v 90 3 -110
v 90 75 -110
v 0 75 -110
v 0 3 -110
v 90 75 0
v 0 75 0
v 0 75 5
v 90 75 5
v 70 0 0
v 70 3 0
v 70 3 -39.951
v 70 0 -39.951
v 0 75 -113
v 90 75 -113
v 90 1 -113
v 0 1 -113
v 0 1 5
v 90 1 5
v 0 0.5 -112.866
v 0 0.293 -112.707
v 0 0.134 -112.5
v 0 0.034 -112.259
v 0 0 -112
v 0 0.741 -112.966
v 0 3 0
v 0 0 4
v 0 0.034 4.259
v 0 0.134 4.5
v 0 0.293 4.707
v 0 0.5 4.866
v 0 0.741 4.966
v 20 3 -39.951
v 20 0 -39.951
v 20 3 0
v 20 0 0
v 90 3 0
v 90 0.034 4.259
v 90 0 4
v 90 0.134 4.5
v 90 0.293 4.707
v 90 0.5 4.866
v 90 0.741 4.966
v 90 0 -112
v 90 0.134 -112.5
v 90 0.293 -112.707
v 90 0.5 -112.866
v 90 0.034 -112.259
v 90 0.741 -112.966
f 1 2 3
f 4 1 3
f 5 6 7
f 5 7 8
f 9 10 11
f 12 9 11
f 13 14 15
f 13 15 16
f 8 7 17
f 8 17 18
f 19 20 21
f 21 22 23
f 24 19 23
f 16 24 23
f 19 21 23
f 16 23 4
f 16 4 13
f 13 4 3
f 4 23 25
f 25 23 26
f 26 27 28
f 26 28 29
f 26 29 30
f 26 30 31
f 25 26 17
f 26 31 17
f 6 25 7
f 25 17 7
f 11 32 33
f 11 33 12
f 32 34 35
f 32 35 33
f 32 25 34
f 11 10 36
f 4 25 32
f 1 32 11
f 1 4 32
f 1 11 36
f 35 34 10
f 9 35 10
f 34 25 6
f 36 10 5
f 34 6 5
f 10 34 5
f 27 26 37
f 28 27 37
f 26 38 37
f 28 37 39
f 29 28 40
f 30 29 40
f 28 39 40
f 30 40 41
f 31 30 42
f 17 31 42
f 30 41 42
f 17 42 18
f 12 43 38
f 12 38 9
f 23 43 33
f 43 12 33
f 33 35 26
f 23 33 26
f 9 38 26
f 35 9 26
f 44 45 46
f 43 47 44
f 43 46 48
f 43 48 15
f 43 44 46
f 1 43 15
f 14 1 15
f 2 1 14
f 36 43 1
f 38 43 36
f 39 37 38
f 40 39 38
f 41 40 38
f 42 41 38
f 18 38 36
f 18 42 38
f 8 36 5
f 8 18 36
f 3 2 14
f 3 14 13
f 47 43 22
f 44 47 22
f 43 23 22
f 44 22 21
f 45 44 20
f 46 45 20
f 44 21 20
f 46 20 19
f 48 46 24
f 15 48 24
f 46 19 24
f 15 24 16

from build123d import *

# Parameters (mm, degrees)
ESBO_O1_W                = 90
ESBO_O1_H                = 110
RESSALTO_EXTRUS_O1_DEPTH = 3
ESBO_O2_W                = 50
ESBO_O2_H                = 39.951487405
CORTE_EXTRUS_O2_DEPTH    = 143.158362399
ESBO_O4_W                = 90
ESBO_O4_H                = 75
RESSALTO_EXTRUS_O2_DEPTH = 5
ESBO_O5_W                = 90
ESBO_O5_H                = 75
RESSALTO_EXTRUS_O3_DEPTH = 3
FILETE5_R                = 1


with BuildPart() as part:
    # Esboço1 → Ressalto-extrusão1 (new body)
    with BuildSketch(Plane(origin=(0, 0, 0), x_dir=(1, 0, 0), z_dir=(0, 1, 0))):
        with Locations((45, 55)):
            Rectangle(ESBO_O1_W, ESBO_O1_H)
    extrude(amount=RESSALTO_EXTRUS_O1_DEPTH)

    # Esboço2 → Corte-extrusão2 (cut, through all)
    with BuildSketch(Plane(origin=(0, 3, 0), x_dir=(1, 0, 0), z_dir=(0, 1, 0))):
        with Locations((45, 19.975743703)):
            Rectangle(ESBO_O2_W, ESBO_O2_H)
    extrude(amount=-CORTE_EXTRUS_O2_DEPTH, mode=Mode.SUBTRACT)

    # Esboço4 → Ressalto-extrusão2 (add)
    with BuildSketch(Plane.XY):
        with Locations((45, 37.5)):
            Rectangle(ESBO_O4_W, ESBO_O4_H)
    extrude(amount=RESSALTO_EXTRUS_O2_DEPTH)

    # Esboço5 → Ressalto-extrusão3 (add)
    with BuildSketch(Plane(origin=(0, 0, -110), x_dir=(-1, 0, 0), z_dir=(0, 0, -1))):
        with Locations((-45, 37.5)):
            Rectangle(ESBO_O5_W, ESBO_O5_H)
    extrude(amount=RESSALTO_EXTRUS_O3_DEPTH)

    # Filete5
    filete5_edges = [part.edges().sort_by_distance(p)[0] for p in [
        (45, 0, 5),
        (45, 0, -113),
    ]]
    fillet(filete5_edges, radius=FILETE5_R)


solid = part.part
